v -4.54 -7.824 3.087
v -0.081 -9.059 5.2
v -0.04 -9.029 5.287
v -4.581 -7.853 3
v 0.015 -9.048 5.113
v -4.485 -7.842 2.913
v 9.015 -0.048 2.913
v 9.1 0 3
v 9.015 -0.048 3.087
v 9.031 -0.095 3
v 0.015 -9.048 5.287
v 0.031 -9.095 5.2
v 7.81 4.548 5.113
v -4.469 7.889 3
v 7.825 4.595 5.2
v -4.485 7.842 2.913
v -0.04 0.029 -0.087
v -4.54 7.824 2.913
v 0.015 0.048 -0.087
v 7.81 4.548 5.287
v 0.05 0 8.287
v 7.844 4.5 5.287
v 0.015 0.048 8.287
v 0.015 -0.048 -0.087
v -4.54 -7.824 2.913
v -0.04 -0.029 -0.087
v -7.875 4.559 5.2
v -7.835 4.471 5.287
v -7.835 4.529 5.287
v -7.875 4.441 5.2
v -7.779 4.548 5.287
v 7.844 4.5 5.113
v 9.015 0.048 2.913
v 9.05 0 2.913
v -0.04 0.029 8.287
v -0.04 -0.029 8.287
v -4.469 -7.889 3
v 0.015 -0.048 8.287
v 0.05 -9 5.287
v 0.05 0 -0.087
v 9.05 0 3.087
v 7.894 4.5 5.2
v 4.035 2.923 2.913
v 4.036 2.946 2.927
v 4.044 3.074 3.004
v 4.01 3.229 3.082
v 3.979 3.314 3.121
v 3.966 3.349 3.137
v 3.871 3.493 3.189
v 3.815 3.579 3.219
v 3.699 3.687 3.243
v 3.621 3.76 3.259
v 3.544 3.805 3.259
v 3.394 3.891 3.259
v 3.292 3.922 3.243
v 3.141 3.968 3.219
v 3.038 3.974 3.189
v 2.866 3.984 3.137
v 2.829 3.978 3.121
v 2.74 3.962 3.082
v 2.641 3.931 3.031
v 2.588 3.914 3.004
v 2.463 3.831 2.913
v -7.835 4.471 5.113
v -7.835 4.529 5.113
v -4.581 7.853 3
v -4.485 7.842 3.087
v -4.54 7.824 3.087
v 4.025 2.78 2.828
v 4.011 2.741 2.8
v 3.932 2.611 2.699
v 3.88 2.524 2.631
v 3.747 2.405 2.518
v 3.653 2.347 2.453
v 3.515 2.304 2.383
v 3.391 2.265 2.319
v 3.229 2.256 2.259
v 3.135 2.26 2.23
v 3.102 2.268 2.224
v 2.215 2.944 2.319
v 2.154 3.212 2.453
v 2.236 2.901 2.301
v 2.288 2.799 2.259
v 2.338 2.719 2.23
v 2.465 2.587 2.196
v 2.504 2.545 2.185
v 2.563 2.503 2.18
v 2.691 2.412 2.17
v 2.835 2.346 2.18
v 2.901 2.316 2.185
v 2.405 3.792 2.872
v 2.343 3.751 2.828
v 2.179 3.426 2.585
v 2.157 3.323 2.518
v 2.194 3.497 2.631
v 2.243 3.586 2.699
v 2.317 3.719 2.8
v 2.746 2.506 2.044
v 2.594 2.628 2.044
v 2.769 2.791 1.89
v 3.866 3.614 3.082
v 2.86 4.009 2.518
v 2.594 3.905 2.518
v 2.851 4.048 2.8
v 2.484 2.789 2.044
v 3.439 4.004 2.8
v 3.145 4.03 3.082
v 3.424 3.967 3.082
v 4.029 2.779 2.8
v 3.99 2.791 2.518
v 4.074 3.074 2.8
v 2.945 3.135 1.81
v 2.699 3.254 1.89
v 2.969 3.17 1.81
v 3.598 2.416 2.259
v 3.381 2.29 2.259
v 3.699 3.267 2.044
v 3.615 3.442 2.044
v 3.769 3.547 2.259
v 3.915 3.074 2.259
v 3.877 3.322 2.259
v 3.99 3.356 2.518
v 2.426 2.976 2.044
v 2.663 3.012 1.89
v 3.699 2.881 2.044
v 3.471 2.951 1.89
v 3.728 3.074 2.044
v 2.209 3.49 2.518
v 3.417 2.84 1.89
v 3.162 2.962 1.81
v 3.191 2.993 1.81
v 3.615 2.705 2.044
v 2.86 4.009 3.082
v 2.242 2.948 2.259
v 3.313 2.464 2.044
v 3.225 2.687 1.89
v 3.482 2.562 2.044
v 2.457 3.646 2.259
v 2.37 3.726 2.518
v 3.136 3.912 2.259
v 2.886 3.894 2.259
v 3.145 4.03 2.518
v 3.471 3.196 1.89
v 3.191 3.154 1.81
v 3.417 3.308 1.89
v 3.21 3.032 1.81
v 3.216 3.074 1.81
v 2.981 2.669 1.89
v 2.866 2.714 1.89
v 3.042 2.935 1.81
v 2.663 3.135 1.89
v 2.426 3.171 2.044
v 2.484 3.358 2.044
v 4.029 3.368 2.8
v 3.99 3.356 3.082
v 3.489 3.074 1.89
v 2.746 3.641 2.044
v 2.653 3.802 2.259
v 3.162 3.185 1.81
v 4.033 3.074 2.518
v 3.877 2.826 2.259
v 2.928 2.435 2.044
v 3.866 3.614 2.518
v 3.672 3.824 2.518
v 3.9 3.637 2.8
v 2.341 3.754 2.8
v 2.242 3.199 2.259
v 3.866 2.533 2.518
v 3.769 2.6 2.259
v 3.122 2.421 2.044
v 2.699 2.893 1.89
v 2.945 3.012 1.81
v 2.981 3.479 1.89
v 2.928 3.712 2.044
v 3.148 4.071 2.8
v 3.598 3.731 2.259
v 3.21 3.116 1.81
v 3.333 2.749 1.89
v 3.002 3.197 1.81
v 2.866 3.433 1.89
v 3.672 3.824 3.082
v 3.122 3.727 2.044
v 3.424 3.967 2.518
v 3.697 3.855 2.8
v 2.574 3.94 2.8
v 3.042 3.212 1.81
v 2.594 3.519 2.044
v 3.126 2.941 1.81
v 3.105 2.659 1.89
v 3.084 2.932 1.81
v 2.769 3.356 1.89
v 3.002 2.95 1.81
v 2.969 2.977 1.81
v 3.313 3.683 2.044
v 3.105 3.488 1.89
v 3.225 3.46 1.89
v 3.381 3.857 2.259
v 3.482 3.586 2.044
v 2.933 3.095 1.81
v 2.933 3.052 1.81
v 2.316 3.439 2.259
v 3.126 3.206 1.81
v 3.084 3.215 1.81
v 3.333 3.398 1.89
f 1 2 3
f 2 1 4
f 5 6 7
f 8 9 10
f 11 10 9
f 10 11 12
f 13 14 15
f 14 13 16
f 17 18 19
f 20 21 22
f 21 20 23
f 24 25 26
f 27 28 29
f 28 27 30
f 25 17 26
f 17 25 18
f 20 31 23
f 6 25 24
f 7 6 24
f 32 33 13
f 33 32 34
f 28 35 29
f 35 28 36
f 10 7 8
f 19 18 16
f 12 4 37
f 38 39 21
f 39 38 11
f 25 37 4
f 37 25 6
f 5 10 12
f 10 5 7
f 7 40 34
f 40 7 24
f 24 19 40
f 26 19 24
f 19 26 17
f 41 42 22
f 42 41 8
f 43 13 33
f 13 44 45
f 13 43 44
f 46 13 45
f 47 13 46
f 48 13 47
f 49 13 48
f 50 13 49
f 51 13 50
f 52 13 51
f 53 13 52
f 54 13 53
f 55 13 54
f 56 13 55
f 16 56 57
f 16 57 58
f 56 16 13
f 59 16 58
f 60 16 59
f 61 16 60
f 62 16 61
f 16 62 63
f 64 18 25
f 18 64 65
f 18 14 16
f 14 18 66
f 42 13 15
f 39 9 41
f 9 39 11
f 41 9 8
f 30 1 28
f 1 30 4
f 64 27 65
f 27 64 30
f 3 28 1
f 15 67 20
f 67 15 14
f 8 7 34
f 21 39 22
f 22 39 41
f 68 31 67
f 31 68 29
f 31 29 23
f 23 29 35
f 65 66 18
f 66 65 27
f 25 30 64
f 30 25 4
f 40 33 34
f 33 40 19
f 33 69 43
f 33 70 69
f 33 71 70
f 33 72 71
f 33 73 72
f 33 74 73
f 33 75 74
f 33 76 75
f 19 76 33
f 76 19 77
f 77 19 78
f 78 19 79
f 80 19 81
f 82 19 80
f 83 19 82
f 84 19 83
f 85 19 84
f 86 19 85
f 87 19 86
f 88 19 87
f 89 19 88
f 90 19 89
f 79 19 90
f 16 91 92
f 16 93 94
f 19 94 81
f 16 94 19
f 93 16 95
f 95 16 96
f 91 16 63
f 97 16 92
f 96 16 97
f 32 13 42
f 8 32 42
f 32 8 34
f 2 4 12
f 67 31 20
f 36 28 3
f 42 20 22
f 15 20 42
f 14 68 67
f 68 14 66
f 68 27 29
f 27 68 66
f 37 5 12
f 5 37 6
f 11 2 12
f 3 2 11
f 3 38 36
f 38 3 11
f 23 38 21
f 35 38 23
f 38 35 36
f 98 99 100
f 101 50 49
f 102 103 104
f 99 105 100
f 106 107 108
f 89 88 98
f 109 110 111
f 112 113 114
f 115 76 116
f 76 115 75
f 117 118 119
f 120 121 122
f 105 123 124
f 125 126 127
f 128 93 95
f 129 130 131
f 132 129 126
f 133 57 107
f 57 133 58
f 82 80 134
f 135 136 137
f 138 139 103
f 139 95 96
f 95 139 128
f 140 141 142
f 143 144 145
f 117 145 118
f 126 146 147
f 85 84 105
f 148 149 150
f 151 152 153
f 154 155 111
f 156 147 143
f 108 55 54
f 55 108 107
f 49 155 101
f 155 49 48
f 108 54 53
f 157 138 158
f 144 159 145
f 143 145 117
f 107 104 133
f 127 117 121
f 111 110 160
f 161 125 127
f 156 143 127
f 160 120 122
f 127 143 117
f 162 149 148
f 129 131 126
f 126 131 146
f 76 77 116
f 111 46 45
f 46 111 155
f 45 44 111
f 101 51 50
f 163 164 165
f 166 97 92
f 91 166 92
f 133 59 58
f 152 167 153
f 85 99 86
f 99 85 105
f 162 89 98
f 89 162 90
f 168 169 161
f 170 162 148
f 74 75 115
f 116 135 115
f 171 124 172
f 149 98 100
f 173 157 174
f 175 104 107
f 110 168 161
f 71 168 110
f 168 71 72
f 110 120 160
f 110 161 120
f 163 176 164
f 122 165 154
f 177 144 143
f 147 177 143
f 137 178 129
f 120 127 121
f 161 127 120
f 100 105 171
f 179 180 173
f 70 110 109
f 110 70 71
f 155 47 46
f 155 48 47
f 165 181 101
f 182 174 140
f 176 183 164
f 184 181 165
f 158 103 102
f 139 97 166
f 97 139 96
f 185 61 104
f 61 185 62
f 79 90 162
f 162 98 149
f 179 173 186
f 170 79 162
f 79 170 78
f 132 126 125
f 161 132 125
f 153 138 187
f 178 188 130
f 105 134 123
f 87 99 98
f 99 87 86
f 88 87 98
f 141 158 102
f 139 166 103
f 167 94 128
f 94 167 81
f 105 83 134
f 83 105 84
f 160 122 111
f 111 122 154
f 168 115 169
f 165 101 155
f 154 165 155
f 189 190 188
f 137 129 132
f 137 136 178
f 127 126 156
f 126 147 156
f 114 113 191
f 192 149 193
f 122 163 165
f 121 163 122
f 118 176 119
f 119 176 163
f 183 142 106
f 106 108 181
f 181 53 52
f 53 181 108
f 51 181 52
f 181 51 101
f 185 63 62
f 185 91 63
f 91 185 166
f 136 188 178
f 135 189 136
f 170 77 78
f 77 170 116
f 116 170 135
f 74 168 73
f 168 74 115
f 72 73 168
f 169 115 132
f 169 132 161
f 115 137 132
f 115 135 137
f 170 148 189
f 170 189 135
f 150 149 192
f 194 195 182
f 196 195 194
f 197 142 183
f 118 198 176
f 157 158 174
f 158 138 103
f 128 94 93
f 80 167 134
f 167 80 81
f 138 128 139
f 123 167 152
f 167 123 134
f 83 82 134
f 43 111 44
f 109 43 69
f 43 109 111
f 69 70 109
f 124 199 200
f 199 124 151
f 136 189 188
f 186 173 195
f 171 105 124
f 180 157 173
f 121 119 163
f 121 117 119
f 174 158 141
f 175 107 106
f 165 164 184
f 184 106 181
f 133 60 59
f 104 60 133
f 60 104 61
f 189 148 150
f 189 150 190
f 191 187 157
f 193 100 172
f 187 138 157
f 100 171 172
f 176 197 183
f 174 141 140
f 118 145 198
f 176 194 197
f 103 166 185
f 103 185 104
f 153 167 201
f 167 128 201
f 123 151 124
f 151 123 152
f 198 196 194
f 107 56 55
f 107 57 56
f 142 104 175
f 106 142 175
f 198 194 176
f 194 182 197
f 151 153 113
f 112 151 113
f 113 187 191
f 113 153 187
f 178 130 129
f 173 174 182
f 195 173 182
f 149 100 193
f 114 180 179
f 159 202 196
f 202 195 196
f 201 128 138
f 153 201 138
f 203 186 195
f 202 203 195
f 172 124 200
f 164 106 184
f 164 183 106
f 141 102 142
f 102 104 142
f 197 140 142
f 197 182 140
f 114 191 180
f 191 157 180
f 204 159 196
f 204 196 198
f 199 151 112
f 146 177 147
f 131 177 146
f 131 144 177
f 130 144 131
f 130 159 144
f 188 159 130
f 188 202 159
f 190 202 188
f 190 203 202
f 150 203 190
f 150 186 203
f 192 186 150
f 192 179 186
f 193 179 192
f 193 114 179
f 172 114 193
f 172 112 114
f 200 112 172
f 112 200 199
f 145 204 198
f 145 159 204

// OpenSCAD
// Generated by SolidPython 0.4.6 on 2020-02-12 18:02:43
$fa = .01;
$fs = 0.3;


union() {
	hull() {
		translate(v = [0, 0, 0]) {
			sphere(r = 0.1000000000);
		}
		translate(v = [9, 0, 3]) {
			sphere(r = 0.1000000000);
		}
		translate(v = [-4.5000000000, 7.7942286341, 3]) {
			sphere(r = 0.1000000000);
		}
		translate(v = [-4.5000000000, -7.7942286341, 3]) {
			sphere(r = 0.1000000000);
		}
		translate(v = [0, 0, 8.2000000000]) {
			sphere(r = 0.1000000000);
		}
		translate(v = [7.7942286341, 4.5000000000, 5.2000000000]) {
			sphere(r = 0.1000000000);
		}
		translate(v = [-7.7942286341, 4.5000000000, 5.2000000000]) {
			sphere(r = 0.1000000000);
		}
		translate(v = [-0.0000000000, -9.0000000000, 5.2000000000]) {
			sphere(r = 0.1000000000);
		}
	}
	color(c = [1, 0, 0]) {
		translate(v = [3.0735571585, 3.0735571585, 2.8000000000]) {
			sphere(r = 1);
		}
	}
}
/***********************************************
*********      SolidPython code:      **********
************************************************
 
from typing import Iterable
from os.path import join as path_join

from solid import *
from solid.utils import *


def line(
    a: Tuple[float, float, float],
    b: Tuple[float, float, float],
    r: float = 1.0,
    capped=True,
):
    if capped:
        return hull()(translate(a)(sphere(r=r)), translate(b)(sphere(r=r)))
    else:
        return hull()(
            hull()(translate(a)(sphere(r=r)), translate(b)(sphere(r=r)))
            - translate(a)(sphere(r=r))
            - translate(b)(sphere(r=r))
        )


def mix(p1: Tuple[float, float, float], p2: Tuple[float, float, float], a: float):
    if len(p1) != len(p2):
        raise IndexError()
    return tuple((x * (1 - a)) + (y * a) for x, y in zip(p1, p2))


def pairwise_hull(objs: Iterable[OpenSCADObject]):
    return sum(hull()(a, b) for a, b in zip(objs, objs[1:]))


def generate_part(part, partname, resolution=0.1):
    scad_render_to_file(
        part,
        path_join("generated", f"{partname}.scad"),
        file_header=f"$fa = .01;\n$fs = {resolution};\n",
    )


standard_pips = (
    (
        (0, 0),
    ),
    (
        (-1, -1),
        (1, 1),
    ),
    (
        (-1, -1),
        (0, 0),
        (1, 1),
    ),
    (
        (-1, -1),
        (-1, 1),
        (1, -1),
        (1, 1),
    ),
    (
        (-1, -1),
        (-1, 1),
        (0, 0),
        (1, -1),
        (1, 1),
    ),
    (
        (-1, -1),
        (-1, 0),
        (-1, 1),
        (1, -1),
        (1, 0),
        (1, 1),
    ),
)

__all__ = ["line", "mix", "pairwise_hull", "generate_part", "standard_pips"]
 
 
************************************************/
